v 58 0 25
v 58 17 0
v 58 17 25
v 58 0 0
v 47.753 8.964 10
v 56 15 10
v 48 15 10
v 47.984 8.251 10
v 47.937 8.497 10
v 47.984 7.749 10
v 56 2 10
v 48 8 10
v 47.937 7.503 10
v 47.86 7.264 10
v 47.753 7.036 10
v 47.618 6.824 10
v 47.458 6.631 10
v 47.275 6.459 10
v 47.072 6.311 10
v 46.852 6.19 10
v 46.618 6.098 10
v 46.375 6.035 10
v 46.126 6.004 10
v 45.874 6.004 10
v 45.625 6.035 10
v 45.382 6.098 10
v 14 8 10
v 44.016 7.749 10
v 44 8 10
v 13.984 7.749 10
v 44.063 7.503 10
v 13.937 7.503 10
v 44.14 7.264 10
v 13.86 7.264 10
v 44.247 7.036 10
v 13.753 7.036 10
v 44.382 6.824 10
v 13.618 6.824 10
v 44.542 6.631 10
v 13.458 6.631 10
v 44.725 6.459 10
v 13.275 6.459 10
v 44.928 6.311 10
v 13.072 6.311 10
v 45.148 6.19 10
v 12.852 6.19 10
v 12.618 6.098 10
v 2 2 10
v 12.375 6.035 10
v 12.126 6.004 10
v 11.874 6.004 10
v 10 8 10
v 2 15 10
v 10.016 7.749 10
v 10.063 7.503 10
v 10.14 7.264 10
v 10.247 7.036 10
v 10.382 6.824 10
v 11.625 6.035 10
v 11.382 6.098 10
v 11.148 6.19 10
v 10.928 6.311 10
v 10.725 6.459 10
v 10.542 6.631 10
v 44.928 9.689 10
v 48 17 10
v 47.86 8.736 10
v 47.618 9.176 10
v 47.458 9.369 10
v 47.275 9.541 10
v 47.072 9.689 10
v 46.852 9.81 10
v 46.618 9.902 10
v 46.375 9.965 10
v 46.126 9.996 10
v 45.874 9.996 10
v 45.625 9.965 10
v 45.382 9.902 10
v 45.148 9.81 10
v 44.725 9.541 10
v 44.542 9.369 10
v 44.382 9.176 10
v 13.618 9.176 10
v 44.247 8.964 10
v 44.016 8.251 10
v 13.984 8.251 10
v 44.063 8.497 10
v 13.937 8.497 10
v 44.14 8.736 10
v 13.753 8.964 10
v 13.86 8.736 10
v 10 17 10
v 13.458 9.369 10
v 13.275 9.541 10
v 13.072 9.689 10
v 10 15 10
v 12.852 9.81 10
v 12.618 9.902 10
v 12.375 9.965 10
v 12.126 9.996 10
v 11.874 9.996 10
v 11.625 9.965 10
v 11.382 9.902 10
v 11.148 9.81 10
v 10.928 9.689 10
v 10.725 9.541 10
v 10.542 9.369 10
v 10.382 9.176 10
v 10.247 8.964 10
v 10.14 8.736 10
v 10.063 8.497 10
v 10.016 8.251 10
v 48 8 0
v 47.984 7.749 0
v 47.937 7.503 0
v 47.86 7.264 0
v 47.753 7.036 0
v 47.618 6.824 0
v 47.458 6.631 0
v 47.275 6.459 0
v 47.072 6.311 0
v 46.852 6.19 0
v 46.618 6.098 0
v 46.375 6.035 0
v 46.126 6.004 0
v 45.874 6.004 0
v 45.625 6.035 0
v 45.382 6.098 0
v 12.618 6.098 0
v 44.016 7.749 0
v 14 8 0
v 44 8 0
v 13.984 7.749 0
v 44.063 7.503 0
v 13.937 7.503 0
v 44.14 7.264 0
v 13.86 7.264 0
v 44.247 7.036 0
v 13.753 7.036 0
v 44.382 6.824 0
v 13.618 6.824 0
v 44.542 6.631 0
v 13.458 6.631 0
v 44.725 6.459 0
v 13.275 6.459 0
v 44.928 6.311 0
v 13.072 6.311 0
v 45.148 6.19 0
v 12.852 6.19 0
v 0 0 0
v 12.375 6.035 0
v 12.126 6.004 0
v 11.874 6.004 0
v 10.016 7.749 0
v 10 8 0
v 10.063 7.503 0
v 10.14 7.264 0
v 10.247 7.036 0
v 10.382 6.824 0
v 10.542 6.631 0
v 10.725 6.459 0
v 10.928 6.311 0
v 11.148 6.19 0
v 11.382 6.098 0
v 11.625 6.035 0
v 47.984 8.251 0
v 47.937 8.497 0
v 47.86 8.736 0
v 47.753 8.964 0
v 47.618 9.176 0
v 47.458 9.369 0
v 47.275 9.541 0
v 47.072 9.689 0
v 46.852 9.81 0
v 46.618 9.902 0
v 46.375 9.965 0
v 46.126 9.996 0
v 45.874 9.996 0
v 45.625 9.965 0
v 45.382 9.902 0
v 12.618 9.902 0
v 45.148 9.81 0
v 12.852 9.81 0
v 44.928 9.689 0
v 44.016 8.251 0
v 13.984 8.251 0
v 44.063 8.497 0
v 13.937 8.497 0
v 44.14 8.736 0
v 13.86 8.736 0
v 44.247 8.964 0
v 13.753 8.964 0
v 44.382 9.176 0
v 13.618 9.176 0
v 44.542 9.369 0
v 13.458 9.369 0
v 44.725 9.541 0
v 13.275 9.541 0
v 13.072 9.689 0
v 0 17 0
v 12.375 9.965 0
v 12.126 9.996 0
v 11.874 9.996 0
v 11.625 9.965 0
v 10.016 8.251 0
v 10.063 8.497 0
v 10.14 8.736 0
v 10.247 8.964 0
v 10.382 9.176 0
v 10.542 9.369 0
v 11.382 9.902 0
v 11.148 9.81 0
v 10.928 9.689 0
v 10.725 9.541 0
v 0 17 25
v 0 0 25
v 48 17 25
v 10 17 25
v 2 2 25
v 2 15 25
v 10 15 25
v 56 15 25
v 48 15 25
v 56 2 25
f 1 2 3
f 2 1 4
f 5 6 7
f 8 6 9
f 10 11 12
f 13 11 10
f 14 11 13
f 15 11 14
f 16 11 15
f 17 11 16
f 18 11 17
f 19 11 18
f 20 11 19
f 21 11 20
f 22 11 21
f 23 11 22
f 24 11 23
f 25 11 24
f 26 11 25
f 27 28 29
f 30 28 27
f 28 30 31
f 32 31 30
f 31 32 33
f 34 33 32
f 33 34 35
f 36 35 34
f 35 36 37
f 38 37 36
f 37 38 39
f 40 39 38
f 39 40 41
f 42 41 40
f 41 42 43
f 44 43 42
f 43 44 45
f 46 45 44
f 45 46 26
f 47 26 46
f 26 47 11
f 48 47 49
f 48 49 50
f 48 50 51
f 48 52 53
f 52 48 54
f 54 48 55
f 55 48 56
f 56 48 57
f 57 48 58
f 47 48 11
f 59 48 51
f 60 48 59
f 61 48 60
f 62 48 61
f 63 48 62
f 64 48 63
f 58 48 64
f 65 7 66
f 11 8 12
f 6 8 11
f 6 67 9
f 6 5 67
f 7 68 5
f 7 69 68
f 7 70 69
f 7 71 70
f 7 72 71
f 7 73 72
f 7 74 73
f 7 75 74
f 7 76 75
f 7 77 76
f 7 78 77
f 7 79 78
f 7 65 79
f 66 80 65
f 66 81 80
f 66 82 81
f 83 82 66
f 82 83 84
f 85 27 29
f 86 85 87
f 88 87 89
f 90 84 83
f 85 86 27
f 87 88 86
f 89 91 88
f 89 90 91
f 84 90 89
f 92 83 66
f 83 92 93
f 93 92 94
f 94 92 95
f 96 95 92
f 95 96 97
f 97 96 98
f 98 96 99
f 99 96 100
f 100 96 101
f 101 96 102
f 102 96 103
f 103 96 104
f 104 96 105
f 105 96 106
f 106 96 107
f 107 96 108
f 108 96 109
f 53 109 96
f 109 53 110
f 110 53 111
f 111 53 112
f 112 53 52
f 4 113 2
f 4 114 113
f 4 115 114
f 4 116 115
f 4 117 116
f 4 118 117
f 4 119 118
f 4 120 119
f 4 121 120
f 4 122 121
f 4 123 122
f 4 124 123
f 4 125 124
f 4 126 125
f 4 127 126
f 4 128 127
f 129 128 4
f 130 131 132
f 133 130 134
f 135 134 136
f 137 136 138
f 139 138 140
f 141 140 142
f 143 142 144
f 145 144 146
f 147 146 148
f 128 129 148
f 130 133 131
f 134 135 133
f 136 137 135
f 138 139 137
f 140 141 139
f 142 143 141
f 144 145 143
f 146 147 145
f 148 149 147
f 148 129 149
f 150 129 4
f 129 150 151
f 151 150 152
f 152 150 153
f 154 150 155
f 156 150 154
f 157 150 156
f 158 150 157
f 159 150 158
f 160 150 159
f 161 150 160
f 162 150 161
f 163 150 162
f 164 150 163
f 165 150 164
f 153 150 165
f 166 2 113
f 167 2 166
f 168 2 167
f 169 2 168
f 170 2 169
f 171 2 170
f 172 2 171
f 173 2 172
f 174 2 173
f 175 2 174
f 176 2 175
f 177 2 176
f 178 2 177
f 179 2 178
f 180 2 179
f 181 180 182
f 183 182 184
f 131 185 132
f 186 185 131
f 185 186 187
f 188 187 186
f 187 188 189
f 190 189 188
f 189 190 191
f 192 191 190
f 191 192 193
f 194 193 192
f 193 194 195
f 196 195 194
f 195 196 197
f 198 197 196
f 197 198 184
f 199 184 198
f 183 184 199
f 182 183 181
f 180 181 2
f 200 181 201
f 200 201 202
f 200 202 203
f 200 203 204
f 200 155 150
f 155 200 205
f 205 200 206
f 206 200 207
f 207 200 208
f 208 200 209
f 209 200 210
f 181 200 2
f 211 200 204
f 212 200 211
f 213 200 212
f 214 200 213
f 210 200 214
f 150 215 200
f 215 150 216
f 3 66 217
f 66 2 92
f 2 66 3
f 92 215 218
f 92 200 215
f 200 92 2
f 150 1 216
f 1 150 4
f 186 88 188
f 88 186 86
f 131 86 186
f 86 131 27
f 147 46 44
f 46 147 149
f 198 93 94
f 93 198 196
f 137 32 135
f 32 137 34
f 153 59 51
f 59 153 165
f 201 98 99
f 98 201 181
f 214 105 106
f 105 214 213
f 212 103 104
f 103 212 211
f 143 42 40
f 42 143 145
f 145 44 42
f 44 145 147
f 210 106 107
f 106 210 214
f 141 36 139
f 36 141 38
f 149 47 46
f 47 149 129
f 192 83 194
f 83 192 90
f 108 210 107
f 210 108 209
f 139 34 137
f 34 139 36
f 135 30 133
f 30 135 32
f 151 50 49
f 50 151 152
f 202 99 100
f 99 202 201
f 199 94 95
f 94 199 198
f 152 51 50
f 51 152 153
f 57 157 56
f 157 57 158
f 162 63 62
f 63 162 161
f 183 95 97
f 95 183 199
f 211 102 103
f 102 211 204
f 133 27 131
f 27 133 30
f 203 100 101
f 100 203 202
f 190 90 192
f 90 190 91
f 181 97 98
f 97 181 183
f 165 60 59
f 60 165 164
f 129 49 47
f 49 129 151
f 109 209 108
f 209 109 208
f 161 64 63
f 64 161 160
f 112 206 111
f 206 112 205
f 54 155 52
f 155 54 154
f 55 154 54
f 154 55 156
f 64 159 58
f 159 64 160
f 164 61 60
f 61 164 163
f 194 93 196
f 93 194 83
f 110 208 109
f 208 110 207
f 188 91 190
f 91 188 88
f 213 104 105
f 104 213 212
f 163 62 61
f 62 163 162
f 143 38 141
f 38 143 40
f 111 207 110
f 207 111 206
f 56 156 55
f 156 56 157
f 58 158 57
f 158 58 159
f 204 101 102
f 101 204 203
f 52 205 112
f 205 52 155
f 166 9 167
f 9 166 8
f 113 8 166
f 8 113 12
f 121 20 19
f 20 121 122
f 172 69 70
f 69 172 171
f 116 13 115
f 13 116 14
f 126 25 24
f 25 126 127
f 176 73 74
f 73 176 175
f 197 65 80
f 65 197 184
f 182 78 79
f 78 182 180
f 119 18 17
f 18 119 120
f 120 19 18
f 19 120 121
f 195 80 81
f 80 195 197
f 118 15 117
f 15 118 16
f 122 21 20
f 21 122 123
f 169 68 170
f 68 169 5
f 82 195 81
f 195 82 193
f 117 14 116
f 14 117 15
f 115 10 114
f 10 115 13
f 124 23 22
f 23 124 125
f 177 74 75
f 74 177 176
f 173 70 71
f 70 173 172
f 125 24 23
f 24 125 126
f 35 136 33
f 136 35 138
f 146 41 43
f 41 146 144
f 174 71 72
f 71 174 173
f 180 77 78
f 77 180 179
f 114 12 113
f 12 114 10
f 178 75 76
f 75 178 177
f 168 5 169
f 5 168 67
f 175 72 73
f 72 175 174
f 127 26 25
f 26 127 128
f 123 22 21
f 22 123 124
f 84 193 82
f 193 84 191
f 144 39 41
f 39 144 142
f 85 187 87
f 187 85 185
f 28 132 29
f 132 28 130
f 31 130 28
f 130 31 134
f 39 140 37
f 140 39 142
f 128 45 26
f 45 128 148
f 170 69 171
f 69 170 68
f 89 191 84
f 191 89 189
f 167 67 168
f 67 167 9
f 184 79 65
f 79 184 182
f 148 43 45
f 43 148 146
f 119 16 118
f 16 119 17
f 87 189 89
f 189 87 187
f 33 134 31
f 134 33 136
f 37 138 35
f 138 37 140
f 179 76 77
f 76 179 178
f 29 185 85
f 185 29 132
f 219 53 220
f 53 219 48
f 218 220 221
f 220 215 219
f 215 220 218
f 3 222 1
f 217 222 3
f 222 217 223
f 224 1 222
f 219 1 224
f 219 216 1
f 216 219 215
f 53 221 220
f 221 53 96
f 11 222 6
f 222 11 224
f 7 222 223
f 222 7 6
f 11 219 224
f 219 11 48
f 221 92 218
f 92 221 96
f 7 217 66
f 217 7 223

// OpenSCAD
// Modifier cette variable pour modifier la hauteur du plancher. Le nombre est en millimètres.
height = 10;

// plancher
difference() {
// rectangle de base
cube (size = [58, 17, height]);
    // trous
    translate ([12,8,0]) cylinder (h=height, r=2, $fn=50);
    translate ([46,8,0]) cylinder (h=height, r=2, $fn=50);
}

// côté 1
translate ([0, 0, height]) cube (size = [2, 15, 15]);

// côté 2
translate ([56, 0, height]) cube (size = [2, 15, 15]);

// fond
translate ([2,0,height]) cube (size = [55, 2, 15]);

// languettes de sécurité
translate ([0,15,height]) cube (size = [10, 2, 15]);
translate ([48,15,height]) cube (size = [10, 2, 15]);
